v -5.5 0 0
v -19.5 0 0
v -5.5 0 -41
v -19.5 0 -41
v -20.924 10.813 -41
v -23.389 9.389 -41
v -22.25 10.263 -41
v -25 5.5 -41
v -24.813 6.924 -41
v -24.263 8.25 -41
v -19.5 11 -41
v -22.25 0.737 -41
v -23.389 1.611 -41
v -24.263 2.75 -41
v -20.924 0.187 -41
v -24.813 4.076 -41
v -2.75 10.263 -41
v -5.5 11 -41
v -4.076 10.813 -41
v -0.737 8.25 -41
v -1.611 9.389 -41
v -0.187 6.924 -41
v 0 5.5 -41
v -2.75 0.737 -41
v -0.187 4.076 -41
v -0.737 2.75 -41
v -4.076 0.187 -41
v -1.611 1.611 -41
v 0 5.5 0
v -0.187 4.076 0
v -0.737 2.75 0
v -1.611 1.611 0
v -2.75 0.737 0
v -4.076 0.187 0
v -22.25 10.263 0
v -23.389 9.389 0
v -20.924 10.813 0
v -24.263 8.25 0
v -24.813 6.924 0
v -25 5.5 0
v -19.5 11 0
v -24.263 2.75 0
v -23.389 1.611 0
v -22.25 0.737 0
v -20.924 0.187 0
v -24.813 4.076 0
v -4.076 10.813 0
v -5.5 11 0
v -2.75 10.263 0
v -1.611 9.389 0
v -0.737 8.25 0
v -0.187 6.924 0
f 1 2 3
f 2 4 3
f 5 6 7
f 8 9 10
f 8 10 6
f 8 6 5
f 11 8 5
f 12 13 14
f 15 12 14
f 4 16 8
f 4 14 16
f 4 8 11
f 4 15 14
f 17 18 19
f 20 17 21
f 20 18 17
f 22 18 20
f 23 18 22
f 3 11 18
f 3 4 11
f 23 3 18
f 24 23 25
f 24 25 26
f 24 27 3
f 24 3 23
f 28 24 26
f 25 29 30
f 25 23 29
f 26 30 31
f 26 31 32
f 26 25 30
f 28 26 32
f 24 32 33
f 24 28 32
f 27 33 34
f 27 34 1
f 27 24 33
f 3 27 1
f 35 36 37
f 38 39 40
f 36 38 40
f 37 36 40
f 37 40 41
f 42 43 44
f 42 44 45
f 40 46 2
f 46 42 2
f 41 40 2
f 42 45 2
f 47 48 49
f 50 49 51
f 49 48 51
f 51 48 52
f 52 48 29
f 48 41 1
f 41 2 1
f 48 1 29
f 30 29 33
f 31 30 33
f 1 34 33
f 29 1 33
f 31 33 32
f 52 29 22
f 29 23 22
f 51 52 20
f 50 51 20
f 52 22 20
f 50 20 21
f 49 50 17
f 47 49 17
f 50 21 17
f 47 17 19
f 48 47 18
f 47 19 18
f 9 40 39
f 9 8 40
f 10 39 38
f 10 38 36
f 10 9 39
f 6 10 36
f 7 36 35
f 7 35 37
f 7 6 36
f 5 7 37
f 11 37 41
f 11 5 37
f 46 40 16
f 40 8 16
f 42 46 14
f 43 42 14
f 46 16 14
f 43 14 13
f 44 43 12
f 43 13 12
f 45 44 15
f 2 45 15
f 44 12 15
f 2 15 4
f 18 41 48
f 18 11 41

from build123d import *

# Parameters (mm, degrees)
SCHIZZO1_W                   = 25
SCHIZZO1_H                   = 41
ESTRUSIONE_ESTRUSIONE1_DEPTH = 11
RACCORDO1_R                  = 5.5


with BuildPart() as part:
    # Schizzo1 → Estrusione-Estrusione1 (new body)
    with BuildSketch(Plane(origin=(0, 0, 0), x_dir=(1, 0, 0), z_dir=(0, 1, 0))):
        with Locations((-12.5, 20.5)):
            Rectangle(SCHIZZO1_W, SCHIZZO1_H)
    extrude(amount=ESTRUSIONE_ESTRUSIONE1_DEPTH)

    # Raccordo1
    raccordo1_edges = [part.edges().sort_by_distance(p)[0] for p in [
        (-25, 11, -20.5),
        (-25, 0, -20.5),
        (0, 0, -20.5),
        (0, 11, -20.5),
    ]]
    fillet(raccordo1_edges, radius=RACCORDO1_R - 0.0001)  # a hair under: the kernel refuses the full size


solid = part.part
